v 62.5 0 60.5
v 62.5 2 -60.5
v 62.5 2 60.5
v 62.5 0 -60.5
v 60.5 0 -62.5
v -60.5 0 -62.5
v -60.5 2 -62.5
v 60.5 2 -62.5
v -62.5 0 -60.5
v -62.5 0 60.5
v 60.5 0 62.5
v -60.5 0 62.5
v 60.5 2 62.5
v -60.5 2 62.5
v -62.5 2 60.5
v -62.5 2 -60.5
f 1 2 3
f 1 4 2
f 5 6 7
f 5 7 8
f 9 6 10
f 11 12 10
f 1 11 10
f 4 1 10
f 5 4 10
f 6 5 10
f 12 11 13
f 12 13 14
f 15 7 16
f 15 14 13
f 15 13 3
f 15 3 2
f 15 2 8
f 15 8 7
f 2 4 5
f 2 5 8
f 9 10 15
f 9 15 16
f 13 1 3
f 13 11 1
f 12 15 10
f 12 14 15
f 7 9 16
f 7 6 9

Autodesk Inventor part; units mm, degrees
ref_plane "YZ Plane" through (0, 0, 0) normal (1, 0, 0) x (0, 1, 0)
ref_plane "XZ Plane" through (0, 0, 0) normal (0, 1, 0) x (-1, 0, 0)
ref_plane "XY Plane" through (0, 0, 0) normal (0, 0, 1) x (1, 0, 0)
sketch "Sketch1" plane through (0, 0, 0) normal (0, 1, 0) x (-1, 0, 0)
  line L0 (62.5, 62.5) -> (62.5, -62.5)
  line L1 (62.5, -62.5) -> (-62.5, -62.5)
  line L2 (-62.5, -62.5) -> (-62.5, 62.5)
  line L3 (-62.5, 62.5) -> (62.5, 62.5)
  line L4 (62.5, 62.5) -> (-62.5, -62.5) construction
  line L5 (62.5, -62.5) -> (-62.5, 62.5) construction
  point P0 (0, 0)
  dimension "d0" = 125
  dimension "d1" = 125
extrude "Extrusion1" add sketch "Sketch1" along normal blind 2
chamfer "Chamfer1" distance 2 angle 45 4 edges at (-62.5, 1, 62.5) (62.5, 1, 62.5) (-62.5, 1, -62.5) (62.5, 1, -62.5)
properties part number "print_platform"
